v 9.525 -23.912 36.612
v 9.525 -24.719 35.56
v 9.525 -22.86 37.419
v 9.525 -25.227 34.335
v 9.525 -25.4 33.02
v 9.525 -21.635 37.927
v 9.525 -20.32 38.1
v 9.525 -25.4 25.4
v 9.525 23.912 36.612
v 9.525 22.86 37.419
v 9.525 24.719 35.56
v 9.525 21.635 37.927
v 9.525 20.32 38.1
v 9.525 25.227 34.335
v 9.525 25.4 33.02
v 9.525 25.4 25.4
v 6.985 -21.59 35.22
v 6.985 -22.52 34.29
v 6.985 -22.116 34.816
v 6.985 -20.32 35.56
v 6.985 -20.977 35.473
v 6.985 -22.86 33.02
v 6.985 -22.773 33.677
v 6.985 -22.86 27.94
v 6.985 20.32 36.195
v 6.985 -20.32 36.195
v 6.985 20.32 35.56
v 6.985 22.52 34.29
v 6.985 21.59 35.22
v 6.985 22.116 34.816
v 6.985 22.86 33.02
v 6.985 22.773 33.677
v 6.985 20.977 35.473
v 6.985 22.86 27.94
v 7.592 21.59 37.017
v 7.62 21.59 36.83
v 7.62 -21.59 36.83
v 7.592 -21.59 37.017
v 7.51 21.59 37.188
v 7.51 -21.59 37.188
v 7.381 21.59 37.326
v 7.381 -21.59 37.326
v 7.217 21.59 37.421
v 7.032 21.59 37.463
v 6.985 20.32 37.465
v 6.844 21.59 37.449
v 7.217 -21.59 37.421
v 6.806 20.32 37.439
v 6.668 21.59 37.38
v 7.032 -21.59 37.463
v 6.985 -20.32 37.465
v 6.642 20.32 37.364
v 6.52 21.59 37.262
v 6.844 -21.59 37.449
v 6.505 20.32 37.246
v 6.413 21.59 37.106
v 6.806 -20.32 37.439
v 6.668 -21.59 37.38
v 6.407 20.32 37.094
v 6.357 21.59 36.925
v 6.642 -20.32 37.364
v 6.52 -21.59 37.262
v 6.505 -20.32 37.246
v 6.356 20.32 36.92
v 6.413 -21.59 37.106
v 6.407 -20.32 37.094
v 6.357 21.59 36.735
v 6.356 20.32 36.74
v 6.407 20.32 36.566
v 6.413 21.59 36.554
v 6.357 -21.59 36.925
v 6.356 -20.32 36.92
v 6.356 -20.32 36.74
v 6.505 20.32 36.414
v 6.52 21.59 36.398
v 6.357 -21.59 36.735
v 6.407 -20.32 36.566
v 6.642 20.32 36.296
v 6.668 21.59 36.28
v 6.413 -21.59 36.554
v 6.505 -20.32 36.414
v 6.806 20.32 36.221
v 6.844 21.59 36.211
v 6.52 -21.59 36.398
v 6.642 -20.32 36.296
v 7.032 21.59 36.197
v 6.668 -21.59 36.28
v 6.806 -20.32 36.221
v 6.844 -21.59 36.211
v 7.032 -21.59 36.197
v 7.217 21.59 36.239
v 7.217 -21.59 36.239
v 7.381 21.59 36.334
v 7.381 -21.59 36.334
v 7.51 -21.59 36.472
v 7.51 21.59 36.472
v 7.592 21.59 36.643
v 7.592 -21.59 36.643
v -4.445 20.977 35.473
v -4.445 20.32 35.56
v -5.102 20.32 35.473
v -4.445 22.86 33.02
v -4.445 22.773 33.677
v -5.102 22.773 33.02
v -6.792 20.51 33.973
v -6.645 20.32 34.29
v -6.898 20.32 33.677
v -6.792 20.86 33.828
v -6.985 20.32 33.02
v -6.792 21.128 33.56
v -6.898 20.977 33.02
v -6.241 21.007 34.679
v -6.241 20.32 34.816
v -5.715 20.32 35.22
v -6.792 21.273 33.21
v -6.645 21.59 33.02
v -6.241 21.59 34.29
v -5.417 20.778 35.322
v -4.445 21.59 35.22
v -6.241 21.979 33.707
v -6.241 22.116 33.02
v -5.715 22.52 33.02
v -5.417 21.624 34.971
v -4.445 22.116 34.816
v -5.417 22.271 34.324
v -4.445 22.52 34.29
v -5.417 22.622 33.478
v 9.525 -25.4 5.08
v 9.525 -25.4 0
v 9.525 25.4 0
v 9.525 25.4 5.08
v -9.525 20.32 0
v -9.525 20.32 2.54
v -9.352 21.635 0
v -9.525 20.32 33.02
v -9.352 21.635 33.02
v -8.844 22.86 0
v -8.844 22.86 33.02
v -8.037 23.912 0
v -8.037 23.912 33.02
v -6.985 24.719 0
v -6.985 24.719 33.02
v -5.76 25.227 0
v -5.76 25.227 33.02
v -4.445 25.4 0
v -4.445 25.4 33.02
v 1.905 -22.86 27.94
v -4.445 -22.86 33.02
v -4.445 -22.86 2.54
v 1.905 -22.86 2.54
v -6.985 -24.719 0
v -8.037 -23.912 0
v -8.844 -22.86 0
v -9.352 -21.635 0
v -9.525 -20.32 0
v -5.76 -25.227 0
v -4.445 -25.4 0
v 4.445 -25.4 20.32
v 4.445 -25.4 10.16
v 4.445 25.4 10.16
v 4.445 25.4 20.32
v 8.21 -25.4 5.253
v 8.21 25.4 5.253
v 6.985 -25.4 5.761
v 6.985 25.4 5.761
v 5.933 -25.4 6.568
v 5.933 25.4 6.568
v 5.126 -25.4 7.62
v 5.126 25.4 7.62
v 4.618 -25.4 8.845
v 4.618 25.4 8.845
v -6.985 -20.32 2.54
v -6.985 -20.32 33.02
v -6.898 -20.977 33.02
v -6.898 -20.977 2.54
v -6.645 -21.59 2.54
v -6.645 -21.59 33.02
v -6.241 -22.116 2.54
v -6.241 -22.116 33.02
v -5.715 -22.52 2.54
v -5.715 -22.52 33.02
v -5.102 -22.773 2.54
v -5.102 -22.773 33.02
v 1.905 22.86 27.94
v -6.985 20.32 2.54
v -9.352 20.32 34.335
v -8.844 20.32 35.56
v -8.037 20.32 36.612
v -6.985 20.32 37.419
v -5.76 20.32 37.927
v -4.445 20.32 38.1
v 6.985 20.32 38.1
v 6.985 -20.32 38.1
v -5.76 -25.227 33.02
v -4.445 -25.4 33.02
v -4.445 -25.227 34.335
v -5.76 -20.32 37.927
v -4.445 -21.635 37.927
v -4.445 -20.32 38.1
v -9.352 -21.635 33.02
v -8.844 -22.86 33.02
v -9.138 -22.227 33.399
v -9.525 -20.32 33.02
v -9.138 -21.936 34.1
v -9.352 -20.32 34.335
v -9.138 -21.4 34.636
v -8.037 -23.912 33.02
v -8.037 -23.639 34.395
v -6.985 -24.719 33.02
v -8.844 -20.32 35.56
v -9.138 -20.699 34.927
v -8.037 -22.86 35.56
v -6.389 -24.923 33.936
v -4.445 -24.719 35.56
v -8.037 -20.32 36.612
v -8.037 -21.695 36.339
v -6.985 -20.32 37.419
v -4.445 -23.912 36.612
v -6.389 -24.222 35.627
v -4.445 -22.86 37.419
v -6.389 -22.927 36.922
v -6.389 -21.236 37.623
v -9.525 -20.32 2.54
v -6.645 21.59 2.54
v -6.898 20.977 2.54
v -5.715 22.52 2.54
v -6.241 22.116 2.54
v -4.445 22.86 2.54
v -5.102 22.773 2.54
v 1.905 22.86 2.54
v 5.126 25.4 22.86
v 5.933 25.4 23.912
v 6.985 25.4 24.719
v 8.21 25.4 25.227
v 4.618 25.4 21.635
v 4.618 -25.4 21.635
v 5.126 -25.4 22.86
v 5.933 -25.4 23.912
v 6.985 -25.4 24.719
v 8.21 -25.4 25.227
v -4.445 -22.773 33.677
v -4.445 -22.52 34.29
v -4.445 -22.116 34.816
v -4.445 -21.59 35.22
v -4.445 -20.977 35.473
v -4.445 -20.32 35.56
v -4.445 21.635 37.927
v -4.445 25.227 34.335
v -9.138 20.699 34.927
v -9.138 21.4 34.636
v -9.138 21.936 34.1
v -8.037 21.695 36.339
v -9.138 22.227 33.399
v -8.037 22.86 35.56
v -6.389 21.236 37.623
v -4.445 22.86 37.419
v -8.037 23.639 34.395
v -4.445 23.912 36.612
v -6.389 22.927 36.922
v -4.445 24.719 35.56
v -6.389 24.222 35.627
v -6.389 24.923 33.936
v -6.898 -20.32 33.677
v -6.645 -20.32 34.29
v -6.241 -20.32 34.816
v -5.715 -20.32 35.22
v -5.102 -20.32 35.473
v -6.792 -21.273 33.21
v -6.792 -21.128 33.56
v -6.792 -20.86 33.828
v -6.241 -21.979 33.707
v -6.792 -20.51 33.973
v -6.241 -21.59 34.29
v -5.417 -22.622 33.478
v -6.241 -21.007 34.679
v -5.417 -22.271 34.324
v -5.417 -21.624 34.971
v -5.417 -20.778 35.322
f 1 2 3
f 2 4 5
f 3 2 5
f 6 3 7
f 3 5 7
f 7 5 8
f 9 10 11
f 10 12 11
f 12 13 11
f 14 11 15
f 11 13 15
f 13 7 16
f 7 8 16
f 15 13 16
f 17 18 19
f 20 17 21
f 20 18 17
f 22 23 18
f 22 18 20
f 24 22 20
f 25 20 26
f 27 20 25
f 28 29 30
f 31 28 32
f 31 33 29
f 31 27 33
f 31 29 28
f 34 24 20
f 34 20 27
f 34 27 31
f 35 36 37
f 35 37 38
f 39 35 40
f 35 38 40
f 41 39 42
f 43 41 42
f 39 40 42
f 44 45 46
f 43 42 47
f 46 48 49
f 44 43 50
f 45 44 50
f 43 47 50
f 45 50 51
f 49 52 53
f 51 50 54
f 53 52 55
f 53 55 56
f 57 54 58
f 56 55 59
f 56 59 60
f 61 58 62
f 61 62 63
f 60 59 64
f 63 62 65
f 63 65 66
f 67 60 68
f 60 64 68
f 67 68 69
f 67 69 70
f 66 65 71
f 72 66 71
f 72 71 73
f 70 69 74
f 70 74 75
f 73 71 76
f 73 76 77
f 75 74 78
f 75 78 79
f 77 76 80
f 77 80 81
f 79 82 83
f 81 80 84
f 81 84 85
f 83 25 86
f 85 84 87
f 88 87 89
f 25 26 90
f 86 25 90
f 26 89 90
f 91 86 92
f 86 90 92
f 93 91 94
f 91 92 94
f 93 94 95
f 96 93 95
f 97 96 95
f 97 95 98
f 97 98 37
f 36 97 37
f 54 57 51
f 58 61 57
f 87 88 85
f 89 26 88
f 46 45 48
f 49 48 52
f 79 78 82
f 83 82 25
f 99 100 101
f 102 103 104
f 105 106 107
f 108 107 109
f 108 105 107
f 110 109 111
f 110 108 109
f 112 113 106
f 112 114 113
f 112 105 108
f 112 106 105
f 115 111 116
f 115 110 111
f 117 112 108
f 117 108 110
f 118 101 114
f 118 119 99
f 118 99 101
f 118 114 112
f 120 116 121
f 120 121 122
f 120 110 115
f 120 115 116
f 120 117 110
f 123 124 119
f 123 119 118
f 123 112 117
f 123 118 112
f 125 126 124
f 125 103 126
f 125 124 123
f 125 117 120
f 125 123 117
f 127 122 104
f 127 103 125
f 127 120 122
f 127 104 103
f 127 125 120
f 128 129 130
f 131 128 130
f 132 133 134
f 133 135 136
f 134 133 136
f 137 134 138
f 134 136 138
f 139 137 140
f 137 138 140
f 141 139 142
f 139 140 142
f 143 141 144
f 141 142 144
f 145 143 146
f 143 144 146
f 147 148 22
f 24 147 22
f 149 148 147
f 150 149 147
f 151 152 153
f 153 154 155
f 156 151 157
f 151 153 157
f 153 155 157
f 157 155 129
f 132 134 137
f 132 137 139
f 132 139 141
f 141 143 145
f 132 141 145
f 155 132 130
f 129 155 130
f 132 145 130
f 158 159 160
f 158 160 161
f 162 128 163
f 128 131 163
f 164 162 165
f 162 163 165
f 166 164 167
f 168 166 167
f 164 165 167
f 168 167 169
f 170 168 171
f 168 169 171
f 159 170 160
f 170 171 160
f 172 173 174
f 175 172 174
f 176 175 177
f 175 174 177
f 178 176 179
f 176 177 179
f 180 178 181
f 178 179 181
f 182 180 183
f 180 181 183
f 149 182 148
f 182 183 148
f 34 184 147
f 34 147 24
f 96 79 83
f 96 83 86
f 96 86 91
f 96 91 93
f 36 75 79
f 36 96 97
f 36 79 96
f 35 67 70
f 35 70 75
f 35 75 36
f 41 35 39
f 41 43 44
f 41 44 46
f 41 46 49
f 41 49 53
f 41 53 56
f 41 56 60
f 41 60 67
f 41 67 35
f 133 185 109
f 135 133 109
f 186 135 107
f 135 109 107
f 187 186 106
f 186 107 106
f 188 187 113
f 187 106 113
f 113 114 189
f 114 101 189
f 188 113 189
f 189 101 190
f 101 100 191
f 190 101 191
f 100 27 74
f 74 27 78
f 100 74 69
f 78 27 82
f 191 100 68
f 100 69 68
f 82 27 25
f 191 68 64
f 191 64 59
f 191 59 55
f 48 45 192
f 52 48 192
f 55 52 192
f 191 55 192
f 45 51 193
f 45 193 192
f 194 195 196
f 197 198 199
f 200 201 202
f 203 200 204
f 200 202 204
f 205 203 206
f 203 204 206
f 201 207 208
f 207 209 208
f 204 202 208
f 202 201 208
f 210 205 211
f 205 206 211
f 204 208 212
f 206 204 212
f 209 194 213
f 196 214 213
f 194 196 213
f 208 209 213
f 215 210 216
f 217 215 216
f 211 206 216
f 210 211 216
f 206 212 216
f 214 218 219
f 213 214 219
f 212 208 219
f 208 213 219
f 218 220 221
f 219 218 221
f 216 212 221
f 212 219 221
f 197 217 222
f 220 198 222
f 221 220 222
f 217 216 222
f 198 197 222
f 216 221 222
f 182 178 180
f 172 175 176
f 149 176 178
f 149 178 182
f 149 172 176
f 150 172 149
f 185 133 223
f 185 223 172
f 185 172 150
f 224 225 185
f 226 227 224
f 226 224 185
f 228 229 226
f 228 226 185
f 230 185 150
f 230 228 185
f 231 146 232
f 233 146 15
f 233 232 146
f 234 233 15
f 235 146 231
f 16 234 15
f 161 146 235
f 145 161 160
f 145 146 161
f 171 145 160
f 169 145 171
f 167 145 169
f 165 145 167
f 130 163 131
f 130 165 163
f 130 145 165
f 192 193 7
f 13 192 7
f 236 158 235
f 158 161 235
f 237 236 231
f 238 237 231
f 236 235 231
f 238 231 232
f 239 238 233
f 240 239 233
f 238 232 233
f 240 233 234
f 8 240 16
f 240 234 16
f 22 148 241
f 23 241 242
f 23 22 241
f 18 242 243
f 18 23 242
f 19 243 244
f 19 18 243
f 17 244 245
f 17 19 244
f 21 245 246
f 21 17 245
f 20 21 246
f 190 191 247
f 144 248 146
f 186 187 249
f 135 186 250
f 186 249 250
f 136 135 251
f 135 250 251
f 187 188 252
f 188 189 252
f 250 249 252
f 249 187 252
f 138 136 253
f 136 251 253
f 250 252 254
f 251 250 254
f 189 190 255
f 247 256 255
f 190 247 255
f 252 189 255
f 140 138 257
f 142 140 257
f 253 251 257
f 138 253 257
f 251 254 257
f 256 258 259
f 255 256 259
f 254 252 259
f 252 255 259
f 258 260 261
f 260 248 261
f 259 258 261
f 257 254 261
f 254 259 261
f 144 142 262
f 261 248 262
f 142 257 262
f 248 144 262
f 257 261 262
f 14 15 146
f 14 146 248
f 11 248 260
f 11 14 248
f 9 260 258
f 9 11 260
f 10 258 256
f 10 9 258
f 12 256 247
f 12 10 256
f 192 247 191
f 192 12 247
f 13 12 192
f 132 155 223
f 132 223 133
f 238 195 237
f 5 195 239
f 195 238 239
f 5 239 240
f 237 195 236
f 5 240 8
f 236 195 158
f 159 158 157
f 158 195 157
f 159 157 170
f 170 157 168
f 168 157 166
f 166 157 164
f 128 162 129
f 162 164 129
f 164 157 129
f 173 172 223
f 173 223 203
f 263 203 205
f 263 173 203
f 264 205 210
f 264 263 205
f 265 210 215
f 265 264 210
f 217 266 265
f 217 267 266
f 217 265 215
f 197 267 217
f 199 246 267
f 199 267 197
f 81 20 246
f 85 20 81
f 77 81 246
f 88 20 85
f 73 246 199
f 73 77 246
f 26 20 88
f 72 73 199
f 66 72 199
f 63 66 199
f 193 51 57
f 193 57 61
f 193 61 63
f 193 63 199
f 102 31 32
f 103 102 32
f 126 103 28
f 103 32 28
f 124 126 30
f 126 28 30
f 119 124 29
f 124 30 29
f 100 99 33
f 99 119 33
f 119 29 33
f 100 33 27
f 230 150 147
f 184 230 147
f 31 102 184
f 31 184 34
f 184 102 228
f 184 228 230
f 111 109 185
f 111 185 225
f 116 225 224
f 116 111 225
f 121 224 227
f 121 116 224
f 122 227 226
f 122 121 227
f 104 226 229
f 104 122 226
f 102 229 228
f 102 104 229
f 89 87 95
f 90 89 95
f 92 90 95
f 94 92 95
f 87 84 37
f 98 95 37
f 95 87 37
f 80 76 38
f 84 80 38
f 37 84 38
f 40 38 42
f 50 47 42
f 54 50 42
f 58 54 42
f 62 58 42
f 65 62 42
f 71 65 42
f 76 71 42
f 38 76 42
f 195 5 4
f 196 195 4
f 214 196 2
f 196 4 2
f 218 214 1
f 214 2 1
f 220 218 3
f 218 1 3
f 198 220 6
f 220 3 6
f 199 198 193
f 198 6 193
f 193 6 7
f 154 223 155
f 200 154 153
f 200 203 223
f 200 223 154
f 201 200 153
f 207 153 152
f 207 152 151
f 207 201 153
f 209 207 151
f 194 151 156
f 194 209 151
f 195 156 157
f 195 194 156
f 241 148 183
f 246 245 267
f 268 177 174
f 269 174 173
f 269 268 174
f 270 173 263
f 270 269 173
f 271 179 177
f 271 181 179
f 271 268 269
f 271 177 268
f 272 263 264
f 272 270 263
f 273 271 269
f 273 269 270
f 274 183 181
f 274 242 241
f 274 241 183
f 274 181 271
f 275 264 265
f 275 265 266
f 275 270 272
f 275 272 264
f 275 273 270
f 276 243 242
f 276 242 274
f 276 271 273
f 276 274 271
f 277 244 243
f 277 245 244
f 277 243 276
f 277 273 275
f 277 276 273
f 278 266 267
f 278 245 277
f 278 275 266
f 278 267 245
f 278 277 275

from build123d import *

# Parameters (mm, degrees)
F0_W        = 19.05
F0_H        = 50.8
F1_DEPTH    = 38.1
F2_R        = 5.08
F3_W        = 5.08
F3_H        = 20.32
F4_DEPTH    = 50.8
F5_T        = 2.54
F5_T3_DEPTH = 55.88
F6_R        = 5.07999
F7_R        = 0.635
F8_DEPTH    = 21.59


# Not quite as in the source:
# - a fillet or chamfer is up to 0.001 mm smaller than in the source, because OpenCascade refuses the exact size
# - a shell that OpenCascade refuses in one call is made with other operations: the cavity is built on its own and cut out


with BuildPart() as f1:
    # F0 (on Top) → F1 (new body)
    with BuildSketch(Plane.XY):
        Rectangle(F0_W, F0_H)
    extrude(amount=F1_DEPTH)

    # F2
    f2_edges = [f1.edges().sort_by_distance(p)[0] for p in [
        (0, -25.4, 38.1),
        (0, 25.4, 38.1),
        (-9.525, -25.4, 19.05),
        (-9.525, 0, 38.1),
        (-9.525, 25.4, 19.05),
    ]]
    fillet(f2_edges, radius=F2_R)

    # F3 (on face) → F4 (cut)
    with BuildSketch(Plane.XZ.offset(25.4)):
        with Locations((6.985, 15.24)):
            Rectangle(F3_W, F3_H)
    extrude(amount=-F4_DEPTH, mode=Mode.SUBTRACT)

    # F5: shell of thickness 2.54, made by hand


with BuildPart() as f5_core1:
    # F5_t2: copy of F1
    add(f1.part)

    # the walls: a layer under each face that stays
    f5_faces = [f5_core1.faces().sort_by_distance(p)[0] for p in [
        (2.54, -25.4, 16.51),
        (9.525, 0, 2.54),
        (6.985, 0, 5.08),
        (4.445, 0, 15.24),
        (6.985, 0, 25.4),
        (9.525, 0, 31.75),
        (2.54, -23.9121024484, 36.6121024484),
        (-8.0371024484, -23.9121024484, 16.51),
        (0, 0, 0),
        (2.54, 25.4, 16.51),
        (2.54, 23.9121024484, 36.6121024484),
        (-8.0371024484, -22.86, 35.56),
        (-8.0371024484, 23.9121024484, 16.51),
        (-8.0371024484, 22.86, 35.56),
    ]]
    thicken(f5_faces, amount=-F5_T, mode=Mode.SUBTRACT)

    # F5_s4 → F5_t3 (cut)
    with BuildSketch(Plane.XZ.offset(-27.94)):
        Polygon((4.4704, 5.1054), (4.445, 2.54), (1.905, 2.54), (1.905, 5.08), align=None)
        Polygon((4.4704, 25.3746), (1.905, 25.4), (1.905, 27.94), (4.445, 27.94), align=None)
    extrude(amount=F5_T3_DEPTH, mode=Mode.SUBTRACT)


with BuildPart() as f1_1:
    add(f1.part)

    # what is left inside the walls is the cavity
    f5_cavity = [f5_core1.part.solids().sort_by_distance(p)[0] for p in [
        (-9.4996, 0, 22.86),
    ]]
    add(f5_cavity, mode=Mode.SUBTRACT)

    # F6 (radius 5.08 in the source; OpenCascade refuses exactly that, so slightly less here)
    f6_edges = [f1_1.edges().sort_by_distance(p)[0] for p in [
        (4.445, 0, 5.08),
        (4.445, 0, 25.4),
    ]]
    fillet(f6_edges, radius=F6_R)

    # F7 (on Front) → F8 (cut, symmetric)
    with BuildSketch(Plane.XZ):
        with Locations((6.985, 36.83)):
            Circle(F7_R)
    extrude(amount=F8_DEPTH, both=True, mode=Mode.SUBTRACT)


solid = f1_1.part
